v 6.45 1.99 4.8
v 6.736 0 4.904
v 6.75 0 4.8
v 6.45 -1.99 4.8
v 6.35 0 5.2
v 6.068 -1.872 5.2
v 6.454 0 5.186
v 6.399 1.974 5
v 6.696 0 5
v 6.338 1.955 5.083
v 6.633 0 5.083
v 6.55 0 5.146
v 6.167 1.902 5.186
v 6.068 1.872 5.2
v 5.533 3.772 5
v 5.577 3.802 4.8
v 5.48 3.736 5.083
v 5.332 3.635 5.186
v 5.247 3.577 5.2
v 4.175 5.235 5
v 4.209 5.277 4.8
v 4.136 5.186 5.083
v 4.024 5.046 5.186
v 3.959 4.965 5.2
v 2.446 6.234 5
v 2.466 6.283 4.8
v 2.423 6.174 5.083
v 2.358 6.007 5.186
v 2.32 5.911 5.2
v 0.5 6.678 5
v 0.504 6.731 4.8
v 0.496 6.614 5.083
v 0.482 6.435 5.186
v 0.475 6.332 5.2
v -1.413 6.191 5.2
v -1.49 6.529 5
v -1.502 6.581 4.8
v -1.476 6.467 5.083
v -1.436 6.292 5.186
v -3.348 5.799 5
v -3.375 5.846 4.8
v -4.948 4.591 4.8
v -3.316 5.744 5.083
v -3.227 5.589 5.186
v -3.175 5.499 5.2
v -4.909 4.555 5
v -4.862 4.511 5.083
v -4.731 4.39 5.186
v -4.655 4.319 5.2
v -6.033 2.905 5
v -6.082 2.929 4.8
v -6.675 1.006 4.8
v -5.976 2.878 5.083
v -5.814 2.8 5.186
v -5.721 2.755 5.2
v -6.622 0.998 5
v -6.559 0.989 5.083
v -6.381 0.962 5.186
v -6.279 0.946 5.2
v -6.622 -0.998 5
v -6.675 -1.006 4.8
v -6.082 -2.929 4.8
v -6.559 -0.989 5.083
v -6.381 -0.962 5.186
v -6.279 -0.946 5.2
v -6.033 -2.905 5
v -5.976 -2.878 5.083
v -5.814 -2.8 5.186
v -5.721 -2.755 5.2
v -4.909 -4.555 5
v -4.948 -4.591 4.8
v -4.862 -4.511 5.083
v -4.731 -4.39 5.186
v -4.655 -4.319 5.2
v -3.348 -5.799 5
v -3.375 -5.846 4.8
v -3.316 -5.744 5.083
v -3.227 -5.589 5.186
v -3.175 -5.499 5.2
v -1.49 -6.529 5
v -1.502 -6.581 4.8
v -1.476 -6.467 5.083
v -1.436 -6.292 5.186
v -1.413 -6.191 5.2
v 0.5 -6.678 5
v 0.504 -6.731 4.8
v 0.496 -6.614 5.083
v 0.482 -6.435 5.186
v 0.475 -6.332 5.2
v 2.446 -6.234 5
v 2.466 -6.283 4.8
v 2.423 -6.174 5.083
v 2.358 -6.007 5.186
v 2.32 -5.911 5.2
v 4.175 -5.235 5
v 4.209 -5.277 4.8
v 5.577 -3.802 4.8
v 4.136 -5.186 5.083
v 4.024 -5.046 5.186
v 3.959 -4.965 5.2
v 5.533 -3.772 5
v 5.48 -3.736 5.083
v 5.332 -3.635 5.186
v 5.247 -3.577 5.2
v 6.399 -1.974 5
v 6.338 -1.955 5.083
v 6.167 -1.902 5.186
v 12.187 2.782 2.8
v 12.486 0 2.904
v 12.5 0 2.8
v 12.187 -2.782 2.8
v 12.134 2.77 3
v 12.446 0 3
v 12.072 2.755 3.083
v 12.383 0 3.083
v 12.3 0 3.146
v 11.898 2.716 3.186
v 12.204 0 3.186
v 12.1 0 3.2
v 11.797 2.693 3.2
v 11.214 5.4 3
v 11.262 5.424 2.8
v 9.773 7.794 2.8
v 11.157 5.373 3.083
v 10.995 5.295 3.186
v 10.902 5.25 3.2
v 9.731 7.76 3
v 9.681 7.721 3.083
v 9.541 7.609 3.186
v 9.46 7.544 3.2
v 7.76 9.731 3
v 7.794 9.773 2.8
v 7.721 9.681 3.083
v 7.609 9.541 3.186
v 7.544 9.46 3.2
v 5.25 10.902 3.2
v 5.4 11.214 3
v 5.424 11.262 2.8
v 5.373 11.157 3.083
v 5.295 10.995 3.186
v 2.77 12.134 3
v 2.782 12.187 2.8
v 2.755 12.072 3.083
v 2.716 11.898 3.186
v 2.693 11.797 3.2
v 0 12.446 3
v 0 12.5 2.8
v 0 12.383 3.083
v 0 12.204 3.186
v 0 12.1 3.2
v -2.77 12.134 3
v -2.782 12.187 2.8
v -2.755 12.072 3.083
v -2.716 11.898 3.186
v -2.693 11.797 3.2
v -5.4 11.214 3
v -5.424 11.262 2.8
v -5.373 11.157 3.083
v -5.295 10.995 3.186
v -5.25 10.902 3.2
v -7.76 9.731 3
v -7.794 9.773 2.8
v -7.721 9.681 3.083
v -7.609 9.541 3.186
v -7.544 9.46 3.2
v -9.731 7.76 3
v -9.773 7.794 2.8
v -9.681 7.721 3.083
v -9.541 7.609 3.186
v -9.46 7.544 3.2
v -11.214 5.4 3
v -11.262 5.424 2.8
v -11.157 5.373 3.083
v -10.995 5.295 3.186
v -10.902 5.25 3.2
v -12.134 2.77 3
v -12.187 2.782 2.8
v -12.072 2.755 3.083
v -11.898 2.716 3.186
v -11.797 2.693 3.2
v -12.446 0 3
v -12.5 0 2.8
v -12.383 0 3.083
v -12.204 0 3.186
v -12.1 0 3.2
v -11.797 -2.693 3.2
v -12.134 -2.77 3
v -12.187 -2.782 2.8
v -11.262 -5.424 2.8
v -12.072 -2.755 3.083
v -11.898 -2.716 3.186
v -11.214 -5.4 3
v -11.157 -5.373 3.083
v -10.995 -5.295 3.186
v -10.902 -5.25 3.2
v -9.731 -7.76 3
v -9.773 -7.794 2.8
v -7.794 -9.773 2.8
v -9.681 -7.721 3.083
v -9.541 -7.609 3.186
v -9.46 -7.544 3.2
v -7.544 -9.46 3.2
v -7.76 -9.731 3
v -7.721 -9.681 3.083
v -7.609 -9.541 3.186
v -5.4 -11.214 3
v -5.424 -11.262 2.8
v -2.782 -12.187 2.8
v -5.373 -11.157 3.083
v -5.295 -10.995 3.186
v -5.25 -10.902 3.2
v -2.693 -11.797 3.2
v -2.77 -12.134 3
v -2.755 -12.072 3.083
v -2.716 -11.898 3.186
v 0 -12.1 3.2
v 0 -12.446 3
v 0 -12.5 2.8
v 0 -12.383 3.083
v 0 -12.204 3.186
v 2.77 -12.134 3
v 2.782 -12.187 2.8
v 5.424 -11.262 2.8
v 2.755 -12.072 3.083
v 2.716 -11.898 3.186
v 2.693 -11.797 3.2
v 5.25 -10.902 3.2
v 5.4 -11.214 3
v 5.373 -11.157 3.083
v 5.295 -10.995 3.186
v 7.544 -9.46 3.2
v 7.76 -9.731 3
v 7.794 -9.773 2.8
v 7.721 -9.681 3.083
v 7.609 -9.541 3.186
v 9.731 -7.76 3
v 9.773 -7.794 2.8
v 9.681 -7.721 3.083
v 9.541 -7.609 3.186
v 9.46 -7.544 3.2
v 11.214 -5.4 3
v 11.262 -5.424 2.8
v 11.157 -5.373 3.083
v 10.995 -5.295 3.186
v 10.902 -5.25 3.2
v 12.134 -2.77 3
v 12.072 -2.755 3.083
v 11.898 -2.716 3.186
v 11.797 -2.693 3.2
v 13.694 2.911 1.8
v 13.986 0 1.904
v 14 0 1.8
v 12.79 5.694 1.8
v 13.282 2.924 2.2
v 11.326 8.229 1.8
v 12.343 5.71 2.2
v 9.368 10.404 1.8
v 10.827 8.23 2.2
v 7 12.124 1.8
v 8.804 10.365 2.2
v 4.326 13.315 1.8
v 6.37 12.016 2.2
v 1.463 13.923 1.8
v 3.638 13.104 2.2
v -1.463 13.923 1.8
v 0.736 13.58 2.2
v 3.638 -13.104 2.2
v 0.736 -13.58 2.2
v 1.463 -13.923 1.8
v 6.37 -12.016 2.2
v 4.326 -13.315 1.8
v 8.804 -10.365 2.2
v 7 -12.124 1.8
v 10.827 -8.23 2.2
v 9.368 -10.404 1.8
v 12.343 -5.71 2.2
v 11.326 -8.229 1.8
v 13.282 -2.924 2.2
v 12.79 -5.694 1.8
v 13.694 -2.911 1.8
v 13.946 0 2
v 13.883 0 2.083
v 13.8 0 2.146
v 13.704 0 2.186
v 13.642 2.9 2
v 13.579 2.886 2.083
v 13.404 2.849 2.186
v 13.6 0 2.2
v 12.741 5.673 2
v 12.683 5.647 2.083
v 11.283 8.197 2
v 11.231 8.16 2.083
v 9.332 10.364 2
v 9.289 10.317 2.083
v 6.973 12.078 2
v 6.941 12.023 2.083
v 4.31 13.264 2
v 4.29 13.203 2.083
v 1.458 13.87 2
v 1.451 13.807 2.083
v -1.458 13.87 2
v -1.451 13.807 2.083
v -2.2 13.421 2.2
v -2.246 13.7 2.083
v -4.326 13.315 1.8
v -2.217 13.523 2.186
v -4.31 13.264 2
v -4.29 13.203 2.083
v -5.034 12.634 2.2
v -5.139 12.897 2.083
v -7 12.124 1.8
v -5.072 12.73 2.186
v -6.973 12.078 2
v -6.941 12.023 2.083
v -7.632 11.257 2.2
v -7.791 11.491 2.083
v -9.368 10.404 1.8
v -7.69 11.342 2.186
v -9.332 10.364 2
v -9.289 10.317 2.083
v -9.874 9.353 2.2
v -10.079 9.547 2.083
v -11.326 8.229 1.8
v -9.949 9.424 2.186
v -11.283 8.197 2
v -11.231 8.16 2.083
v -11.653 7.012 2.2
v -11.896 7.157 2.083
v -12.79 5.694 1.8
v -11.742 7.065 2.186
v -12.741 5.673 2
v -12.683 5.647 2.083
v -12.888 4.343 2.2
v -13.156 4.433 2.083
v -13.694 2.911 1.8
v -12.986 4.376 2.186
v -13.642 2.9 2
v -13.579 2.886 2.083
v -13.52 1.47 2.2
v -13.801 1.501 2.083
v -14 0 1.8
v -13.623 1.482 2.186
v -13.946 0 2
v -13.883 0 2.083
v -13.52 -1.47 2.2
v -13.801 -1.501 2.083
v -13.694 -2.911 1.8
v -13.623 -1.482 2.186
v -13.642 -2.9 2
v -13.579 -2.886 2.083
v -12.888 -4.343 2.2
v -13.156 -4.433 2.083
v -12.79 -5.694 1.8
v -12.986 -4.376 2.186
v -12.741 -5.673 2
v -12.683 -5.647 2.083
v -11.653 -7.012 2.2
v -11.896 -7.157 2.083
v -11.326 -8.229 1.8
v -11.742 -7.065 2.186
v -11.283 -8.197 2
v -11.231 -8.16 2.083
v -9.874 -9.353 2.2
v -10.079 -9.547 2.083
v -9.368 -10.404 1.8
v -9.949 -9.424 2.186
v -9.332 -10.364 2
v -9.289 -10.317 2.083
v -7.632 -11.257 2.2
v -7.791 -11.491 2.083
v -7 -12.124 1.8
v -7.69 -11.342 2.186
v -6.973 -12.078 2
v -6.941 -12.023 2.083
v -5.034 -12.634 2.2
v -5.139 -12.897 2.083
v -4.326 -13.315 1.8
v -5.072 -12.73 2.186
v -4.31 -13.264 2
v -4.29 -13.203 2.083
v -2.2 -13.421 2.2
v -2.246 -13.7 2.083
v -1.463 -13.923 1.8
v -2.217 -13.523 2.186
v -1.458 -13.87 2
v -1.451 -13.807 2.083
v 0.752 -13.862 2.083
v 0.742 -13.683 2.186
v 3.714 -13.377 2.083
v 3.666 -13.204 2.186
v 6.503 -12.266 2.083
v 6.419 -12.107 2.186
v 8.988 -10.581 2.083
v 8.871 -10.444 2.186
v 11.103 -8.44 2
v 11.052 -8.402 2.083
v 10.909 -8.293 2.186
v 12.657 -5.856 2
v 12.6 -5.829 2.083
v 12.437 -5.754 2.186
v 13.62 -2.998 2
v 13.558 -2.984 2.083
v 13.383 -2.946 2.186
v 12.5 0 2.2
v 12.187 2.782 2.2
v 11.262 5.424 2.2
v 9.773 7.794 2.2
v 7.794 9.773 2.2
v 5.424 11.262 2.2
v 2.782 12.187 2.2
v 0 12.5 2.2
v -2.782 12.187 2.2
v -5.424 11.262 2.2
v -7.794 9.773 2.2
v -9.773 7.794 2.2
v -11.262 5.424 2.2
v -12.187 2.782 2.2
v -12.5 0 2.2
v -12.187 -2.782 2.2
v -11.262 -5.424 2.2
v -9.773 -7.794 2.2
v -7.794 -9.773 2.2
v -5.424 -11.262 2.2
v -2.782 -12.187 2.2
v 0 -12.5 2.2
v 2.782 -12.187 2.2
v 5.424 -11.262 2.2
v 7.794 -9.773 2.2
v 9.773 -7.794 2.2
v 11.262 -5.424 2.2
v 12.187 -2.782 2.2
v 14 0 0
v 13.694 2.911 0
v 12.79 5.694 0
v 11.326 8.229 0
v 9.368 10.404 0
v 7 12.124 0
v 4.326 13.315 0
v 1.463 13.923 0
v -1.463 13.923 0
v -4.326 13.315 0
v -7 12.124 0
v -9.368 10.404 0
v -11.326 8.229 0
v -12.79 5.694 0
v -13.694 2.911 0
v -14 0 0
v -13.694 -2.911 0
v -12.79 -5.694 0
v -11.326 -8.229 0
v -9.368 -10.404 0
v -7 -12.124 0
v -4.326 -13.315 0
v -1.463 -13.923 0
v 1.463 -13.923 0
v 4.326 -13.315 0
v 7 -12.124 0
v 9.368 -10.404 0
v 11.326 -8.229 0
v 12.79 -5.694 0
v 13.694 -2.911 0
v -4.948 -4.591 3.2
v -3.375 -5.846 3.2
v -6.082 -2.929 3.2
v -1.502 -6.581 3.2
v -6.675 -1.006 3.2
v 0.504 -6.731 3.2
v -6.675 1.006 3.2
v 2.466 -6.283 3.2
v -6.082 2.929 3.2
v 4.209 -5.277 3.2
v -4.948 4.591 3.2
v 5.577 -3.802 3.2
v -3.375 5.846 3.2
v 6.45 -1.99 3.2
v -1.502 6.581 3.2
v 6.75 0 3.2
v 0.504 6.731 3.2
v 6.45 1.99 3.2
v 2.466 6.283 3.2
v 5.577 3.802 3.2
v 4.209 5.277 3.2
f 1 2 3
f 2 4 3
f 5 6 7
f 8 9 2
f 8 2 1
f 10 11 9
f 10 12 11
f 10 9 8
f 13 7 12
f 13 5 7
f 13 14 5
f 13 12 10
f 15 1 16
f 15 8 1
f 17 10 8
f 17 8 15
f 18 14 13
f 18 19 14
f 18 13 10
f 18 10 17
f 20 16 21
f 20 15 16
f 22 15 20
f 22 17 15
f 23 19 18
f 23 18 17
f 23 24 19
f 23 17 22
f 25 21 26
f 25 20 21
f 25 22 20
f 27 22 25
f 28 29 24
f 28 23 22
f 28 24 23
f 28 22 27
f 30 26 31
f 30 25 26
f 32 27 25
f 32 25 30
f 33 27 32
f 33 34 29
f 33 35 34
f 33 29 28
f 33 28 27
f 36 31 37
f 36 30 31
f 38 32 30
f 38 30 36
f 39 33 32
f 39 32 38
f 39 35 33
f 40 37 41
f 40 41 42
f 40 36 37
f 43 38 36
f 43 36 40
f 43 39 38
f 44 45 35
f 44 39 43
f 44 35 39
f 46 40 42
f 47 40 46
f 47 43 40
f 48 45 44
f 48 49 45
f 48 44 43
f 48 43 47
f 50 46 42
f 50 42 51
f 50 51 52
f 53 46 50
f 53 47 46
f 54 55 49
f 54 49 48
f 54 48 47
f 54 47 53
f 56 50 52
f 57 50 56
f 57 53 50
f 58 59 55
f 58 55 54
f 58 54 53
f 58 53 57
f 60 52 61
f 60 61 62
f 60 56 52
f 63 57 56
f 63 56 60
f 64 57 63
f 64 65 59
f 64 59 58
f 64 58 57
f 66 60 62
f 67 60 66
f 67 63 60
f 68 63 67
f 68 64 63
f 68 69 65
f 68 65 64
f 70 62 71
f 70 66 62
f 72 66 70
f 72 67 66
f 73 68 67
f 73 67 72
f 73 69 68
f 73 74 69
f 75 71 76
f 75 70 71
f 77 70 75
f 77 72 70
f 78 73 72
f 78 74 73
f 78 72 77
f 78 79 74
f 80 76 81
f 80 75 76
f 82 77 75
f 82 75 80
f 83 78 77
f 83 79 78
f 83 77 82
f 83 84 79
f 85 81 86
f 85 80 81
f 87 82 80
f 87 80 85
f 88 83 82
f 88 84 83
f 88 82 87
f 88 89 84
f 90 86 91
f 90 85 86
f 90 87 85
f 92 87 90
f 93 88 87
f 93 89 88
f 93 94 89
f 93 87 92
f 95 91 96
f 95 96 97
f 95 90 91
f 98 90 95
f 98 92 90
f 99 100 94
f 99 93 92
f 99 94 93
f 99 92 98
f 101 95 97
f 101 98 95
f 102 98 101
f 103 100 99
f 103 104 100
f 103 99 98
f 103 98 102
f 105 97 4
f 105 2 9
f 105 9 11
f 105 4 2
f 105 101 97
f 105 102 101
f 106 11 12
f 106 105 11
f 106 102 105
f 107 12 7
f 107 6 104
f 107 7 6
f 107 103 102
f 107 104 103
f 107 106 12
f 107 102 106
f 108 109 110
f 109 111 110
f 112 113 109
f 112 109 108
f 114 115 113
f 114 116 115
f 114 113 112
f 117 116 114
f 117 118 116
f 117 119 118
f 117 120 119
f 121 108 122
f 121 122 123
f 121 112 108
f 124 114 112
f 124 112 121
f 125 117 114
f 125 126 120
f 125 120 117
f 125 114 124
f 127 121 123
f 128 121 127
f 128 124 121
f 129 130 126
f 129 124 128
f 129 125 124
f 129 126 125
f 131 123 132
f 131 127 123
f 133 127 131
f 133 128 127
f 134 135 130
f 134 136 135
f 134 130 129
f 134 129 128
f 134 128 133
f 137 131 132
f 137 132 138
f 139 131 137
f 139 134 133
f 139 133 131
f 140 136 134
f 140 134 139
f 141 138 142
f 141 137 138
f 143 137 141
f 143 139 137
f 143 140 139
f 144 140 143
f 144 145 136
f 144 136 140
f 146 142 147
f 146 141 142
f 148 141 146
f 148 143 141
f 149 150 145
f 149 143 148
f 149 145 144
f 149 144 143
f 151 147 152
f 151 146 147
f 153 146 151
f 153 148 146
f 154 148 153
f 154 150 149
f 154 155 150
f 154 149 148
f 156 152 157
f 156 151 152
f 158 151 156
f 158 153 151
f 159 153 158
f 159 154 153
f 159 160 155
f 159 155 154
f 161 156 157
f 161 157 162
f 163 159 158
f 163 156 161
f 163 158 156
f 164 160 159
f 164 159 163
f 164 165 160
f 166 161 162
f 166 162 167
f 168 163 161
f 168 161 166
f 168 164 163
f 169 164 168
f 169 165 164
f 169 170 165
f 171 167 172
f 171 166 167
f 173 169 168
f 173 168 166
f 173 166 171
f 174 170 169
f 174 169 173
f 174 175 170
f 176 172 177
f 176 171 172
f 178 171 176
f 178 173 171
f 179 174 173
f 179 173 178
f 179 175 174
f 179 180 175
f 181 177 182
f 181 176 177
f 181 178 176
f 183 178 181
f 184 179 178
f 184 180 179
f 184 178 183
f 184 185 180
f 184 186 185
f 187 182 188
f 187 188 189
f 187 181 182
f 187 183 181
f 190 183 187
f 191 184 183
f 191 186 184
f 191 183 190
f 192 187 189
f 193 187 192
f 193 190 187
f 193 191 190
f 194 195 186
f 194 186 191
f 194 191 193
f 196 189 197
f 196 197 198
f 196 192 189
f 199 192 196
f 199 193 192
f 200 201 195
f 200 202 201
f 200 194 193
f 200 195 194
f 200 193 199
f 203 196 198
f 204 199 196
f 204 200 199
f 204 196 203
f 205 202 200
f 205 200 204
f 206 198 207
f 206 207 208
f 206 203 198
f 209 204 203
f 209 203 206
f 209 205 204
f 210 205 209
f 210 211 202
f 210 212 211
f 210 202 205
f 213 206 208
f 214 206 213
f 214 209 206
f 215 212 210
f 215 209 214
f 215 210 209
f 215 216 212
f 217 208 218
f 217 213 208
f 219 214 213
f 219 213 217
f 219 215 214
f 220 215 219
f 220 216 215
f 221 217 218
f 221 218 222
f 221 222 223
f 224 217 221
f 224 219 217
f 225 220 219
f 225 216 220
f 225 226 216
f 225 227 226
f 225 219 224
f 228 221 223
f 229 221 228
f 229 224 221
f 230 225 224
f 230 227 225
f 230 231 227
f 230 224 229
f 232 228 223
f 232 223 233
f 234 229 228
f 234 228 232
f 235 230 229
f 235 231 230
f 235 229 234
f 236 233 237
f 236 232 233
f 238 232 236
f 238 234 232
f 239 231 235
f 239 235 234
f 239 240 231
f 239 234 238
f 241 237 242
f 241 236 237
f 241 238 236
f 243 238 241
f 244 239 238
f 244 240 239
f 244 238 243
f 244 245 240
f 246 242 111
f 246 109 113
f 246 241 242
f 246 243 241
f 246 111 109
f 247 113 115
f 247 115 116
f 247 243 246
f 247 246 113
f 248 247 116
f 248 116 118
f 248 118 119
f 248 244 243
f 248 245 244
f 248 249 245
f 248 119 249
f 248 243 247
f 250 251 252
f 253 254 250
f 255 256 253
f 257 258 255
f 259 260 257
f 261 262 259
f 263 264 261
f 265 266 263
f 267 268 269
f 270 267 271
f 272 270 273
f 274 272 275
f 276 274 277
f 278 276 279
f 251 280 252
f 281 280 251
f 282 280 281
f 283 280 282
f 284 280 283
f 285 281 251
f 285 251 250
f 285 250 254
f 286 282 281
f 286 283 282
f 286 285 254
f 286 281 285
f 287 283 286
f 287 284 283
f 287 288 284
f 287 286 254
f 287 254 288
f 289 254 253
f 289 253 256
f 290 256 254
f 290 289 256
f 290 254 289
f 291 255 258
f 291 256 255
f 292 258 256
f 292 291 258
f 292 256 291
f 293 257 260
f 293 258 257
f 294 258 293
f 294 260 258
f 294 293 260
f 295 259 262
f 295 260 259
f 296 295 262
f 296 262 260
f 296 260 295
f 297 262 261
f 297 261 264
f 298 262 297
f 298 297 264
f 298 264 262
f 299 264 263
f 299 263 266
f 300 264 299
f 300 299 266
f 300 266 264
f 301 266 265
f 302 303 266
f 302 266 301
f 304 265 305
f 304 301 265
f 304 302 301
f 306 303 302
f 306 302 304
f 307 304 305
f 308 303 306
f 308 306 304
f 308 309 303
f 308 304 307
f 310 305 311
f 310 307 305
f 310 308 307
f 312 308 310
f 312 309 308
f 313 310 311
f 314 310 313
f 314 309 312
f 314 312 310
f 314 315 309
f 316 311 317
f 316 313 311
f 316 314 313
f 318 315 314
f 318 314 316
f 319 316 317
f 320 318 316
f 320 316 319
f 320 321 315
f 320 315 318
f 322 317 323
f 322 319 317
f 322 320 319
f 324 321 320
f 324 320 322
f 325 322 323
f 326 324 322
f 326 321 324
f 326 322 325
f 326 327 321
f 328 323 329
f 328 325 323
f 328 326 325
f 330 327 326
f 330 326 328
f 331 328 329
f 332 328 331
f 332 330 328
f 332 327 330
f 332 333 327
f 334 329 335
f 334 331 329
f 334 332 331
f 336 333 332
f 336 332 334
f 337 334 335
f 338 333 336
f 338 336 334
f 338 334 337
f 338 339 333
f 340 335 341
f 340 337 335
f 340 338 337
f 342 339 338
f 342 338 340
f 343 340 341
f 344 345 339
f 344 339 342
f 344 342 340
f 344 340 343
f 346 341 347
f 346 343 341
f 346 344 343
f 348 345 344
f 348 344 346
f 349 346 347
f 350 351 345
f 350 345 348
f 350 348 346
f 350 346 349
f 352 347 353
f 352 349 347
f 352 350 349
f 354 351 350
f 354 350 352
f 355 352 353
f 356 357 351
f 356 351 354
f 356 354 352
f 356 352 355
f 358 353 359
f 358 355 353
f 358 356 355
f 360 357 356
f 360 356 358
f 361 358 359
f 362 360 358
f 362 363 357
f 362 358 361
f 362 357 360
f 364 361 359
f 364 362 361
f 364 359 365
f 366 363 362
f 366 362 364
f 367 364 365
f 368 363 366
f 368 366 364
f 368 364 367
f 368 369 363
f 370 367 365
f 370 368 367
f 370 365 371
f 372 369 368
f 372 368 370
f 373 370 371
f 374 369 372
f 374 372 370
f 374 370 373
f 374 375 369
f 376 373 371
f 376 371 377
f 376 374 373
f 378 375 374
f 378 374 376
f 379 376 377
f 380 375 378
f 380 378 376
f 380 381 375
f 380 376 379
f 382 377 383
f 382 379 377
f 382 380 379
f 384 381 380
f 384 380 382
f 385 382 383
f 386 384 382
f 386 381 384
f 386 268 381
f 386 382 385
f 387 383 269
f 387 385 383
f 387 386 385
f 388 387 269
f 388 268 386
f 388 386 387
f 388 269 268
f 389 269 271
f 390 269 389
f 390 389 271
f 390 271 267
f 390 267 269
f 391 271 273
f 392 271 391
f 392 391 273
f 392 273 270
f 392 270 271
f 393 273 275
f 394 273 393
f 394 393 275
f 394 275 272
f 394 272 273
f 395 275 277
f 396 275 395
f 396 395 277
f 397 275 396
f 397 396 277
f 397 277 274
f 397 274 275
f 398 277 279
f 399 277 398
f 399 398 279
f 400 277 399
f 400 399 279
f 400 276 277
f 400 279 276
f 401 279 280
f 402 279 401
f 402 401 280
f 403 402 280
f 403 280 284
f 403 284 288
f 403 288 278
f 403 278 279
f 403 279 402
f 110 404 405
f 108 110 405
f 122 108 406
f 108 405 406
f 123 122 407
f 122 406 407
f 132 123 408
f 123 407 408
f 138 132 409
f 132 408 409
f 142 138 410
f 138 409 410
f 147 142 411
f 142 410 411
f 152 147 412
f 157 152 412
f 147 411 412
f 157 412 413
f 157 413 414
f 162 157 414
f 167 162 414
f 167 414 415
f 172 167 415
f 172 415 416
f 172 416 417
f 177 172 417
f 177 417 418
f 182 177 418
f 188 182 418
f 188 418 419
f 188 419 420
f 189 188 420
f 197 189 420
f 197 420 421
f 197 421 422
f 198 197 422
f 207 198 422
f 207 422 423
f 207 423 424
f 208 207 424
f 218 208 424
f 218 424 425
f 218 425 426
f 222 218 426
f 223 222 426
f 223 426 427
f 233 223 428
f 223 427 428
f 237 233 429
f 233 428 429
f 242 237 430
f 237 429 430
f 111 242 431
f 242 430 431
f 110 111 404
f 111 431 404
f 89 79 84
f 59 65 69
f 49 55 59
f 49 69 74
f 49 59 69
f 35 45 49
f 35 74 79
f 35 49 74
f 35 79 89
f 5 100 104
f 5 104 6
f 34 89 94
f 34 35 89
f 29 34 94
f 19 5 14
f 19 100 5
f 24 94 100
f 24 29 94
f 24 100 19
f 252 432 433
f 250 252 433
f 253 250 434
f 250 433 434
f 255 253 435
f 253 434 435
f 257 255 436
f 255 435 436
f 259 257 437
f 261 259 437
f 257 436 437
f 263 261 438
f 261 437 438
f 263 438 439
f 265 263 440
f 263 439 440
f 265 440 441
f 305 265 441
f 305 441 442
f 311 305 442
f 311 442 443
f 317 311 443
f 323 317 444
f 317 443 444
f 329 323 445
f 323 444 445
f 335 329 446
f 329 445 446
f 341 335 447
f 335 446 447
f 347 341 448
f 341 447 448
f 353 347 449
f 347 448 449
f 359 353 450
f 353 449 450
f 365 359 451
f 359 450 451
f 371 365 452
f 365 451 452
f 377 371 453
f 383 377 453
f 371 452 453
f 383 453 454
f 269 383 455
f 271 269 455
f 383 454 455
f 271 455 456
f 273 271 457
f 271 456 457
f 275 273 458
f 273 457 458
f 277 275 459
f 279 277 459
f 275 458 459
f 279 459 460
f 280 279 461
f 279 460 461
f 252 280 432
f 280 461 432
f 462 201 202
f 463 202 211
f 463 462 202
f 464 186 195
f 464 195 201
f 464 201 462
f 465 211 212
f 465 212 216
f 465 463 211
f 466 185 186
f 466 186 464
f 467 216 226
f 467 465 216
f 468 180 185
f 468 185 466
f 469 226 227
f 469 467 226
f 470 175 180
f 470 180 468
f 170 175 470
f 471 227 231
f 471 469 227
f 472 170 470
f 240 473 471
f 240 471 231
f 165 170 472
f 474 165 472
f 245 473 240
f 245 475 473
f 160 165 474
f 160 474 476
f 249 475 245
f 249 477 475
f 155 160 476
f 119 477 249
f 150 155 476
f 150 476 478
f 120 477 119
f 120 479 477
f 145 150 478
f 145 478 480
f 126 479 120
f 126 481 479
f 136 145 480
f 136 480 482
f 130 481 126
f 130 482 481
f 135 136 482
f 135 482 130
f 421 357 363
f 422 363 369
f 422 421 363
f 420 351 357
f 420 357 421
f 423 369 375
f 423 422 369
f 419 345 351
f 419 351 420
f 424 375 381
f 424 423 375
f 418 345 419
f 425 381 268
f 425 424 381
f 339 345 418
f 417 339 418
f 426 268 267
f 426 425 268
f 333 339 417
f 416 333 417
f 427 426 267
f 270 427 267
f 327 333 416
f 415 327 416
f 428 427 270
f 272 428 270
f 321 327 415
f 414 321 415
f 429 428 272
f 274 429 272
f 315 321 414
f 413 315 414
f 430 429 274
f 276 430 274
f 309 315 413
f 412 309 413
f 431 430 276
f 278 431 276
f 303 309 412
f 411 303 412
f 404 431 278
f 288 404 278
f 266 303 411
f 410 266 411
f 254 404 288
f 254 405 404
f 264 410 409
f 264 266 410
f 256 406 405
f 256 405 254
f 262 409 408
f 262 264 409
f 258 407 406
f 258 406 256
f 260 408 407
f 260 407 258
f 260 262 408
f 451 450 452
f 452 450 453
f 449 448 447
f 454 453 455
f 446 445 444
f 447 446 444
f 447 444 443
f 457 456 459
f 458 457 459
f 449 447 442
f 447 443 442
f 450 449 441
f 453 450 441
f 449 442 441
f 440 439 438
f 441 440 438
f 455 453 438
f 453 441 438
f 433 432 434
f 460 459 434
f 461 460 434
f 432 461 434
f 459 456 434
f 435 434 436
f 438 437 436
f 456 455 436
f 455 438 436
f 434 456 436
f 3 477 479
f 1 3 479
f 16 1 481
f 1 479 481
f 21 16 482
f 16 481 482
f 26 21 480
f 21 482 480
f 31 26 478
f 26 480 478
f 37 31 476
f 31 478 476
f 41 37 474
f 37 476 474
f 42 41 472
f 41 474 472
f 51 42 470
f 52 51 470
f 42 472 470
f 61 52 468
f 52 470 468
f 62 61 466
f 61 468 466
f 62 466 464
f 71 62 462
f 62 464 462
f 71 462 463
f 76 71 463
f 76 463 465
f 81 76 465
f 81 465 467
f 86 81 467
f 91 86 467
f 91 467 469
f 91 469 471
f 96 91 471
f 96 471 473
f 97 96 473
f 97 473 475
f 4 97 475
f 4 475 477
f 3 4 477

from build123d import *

# Parameters (mm, degrees)
SKETCH2_R           = 14
BOSS_EXTRUDE2_DEPTH = 2.2
SKETCH3_R           = 12.5
BOSS_EXTRUDE5_DEPTH = 3.2
SKETCH4_R           = 6.75
BOSS_EXTRUDE6_DEPTH = 5.2
FILLET1_R           = 0.4


with BuildPart() as part:
    # Sketch2 → Boss-Extrude2 (new body)
    with BuildSketch(Plane.XY):
        Circle(SKETCH2_R)
    extrude(amount=BOSS_EXTRUDE2_DEPTH)

    # Sketch3 → Boss-Extrude5 (add)
    with BuildSketch(Plane.XY):
        Circle(SKETCH3_R)
    extrude(amount=BOSS_EXTRUDE5_DEPTH)

    # Sketch4 → Boss-Extrude6 (add)
    with BuildSketch(Plane.XY):
        Circle(SKETCH4_R)
    extrude(amount=BOSS_EXTRUDE6_DEPTH)

    # Fillet1
    fillet1_edges = [part.edges().sort_by_distance(p)[0] for p in [
        (-6.75, 0, 5.2),
        (-14, 0, 2.2),
        (-12.5, 0, 3.2),
    ]]
    fillet(fillet1_edges, radius=FILLET1_R)


solid = part.part
